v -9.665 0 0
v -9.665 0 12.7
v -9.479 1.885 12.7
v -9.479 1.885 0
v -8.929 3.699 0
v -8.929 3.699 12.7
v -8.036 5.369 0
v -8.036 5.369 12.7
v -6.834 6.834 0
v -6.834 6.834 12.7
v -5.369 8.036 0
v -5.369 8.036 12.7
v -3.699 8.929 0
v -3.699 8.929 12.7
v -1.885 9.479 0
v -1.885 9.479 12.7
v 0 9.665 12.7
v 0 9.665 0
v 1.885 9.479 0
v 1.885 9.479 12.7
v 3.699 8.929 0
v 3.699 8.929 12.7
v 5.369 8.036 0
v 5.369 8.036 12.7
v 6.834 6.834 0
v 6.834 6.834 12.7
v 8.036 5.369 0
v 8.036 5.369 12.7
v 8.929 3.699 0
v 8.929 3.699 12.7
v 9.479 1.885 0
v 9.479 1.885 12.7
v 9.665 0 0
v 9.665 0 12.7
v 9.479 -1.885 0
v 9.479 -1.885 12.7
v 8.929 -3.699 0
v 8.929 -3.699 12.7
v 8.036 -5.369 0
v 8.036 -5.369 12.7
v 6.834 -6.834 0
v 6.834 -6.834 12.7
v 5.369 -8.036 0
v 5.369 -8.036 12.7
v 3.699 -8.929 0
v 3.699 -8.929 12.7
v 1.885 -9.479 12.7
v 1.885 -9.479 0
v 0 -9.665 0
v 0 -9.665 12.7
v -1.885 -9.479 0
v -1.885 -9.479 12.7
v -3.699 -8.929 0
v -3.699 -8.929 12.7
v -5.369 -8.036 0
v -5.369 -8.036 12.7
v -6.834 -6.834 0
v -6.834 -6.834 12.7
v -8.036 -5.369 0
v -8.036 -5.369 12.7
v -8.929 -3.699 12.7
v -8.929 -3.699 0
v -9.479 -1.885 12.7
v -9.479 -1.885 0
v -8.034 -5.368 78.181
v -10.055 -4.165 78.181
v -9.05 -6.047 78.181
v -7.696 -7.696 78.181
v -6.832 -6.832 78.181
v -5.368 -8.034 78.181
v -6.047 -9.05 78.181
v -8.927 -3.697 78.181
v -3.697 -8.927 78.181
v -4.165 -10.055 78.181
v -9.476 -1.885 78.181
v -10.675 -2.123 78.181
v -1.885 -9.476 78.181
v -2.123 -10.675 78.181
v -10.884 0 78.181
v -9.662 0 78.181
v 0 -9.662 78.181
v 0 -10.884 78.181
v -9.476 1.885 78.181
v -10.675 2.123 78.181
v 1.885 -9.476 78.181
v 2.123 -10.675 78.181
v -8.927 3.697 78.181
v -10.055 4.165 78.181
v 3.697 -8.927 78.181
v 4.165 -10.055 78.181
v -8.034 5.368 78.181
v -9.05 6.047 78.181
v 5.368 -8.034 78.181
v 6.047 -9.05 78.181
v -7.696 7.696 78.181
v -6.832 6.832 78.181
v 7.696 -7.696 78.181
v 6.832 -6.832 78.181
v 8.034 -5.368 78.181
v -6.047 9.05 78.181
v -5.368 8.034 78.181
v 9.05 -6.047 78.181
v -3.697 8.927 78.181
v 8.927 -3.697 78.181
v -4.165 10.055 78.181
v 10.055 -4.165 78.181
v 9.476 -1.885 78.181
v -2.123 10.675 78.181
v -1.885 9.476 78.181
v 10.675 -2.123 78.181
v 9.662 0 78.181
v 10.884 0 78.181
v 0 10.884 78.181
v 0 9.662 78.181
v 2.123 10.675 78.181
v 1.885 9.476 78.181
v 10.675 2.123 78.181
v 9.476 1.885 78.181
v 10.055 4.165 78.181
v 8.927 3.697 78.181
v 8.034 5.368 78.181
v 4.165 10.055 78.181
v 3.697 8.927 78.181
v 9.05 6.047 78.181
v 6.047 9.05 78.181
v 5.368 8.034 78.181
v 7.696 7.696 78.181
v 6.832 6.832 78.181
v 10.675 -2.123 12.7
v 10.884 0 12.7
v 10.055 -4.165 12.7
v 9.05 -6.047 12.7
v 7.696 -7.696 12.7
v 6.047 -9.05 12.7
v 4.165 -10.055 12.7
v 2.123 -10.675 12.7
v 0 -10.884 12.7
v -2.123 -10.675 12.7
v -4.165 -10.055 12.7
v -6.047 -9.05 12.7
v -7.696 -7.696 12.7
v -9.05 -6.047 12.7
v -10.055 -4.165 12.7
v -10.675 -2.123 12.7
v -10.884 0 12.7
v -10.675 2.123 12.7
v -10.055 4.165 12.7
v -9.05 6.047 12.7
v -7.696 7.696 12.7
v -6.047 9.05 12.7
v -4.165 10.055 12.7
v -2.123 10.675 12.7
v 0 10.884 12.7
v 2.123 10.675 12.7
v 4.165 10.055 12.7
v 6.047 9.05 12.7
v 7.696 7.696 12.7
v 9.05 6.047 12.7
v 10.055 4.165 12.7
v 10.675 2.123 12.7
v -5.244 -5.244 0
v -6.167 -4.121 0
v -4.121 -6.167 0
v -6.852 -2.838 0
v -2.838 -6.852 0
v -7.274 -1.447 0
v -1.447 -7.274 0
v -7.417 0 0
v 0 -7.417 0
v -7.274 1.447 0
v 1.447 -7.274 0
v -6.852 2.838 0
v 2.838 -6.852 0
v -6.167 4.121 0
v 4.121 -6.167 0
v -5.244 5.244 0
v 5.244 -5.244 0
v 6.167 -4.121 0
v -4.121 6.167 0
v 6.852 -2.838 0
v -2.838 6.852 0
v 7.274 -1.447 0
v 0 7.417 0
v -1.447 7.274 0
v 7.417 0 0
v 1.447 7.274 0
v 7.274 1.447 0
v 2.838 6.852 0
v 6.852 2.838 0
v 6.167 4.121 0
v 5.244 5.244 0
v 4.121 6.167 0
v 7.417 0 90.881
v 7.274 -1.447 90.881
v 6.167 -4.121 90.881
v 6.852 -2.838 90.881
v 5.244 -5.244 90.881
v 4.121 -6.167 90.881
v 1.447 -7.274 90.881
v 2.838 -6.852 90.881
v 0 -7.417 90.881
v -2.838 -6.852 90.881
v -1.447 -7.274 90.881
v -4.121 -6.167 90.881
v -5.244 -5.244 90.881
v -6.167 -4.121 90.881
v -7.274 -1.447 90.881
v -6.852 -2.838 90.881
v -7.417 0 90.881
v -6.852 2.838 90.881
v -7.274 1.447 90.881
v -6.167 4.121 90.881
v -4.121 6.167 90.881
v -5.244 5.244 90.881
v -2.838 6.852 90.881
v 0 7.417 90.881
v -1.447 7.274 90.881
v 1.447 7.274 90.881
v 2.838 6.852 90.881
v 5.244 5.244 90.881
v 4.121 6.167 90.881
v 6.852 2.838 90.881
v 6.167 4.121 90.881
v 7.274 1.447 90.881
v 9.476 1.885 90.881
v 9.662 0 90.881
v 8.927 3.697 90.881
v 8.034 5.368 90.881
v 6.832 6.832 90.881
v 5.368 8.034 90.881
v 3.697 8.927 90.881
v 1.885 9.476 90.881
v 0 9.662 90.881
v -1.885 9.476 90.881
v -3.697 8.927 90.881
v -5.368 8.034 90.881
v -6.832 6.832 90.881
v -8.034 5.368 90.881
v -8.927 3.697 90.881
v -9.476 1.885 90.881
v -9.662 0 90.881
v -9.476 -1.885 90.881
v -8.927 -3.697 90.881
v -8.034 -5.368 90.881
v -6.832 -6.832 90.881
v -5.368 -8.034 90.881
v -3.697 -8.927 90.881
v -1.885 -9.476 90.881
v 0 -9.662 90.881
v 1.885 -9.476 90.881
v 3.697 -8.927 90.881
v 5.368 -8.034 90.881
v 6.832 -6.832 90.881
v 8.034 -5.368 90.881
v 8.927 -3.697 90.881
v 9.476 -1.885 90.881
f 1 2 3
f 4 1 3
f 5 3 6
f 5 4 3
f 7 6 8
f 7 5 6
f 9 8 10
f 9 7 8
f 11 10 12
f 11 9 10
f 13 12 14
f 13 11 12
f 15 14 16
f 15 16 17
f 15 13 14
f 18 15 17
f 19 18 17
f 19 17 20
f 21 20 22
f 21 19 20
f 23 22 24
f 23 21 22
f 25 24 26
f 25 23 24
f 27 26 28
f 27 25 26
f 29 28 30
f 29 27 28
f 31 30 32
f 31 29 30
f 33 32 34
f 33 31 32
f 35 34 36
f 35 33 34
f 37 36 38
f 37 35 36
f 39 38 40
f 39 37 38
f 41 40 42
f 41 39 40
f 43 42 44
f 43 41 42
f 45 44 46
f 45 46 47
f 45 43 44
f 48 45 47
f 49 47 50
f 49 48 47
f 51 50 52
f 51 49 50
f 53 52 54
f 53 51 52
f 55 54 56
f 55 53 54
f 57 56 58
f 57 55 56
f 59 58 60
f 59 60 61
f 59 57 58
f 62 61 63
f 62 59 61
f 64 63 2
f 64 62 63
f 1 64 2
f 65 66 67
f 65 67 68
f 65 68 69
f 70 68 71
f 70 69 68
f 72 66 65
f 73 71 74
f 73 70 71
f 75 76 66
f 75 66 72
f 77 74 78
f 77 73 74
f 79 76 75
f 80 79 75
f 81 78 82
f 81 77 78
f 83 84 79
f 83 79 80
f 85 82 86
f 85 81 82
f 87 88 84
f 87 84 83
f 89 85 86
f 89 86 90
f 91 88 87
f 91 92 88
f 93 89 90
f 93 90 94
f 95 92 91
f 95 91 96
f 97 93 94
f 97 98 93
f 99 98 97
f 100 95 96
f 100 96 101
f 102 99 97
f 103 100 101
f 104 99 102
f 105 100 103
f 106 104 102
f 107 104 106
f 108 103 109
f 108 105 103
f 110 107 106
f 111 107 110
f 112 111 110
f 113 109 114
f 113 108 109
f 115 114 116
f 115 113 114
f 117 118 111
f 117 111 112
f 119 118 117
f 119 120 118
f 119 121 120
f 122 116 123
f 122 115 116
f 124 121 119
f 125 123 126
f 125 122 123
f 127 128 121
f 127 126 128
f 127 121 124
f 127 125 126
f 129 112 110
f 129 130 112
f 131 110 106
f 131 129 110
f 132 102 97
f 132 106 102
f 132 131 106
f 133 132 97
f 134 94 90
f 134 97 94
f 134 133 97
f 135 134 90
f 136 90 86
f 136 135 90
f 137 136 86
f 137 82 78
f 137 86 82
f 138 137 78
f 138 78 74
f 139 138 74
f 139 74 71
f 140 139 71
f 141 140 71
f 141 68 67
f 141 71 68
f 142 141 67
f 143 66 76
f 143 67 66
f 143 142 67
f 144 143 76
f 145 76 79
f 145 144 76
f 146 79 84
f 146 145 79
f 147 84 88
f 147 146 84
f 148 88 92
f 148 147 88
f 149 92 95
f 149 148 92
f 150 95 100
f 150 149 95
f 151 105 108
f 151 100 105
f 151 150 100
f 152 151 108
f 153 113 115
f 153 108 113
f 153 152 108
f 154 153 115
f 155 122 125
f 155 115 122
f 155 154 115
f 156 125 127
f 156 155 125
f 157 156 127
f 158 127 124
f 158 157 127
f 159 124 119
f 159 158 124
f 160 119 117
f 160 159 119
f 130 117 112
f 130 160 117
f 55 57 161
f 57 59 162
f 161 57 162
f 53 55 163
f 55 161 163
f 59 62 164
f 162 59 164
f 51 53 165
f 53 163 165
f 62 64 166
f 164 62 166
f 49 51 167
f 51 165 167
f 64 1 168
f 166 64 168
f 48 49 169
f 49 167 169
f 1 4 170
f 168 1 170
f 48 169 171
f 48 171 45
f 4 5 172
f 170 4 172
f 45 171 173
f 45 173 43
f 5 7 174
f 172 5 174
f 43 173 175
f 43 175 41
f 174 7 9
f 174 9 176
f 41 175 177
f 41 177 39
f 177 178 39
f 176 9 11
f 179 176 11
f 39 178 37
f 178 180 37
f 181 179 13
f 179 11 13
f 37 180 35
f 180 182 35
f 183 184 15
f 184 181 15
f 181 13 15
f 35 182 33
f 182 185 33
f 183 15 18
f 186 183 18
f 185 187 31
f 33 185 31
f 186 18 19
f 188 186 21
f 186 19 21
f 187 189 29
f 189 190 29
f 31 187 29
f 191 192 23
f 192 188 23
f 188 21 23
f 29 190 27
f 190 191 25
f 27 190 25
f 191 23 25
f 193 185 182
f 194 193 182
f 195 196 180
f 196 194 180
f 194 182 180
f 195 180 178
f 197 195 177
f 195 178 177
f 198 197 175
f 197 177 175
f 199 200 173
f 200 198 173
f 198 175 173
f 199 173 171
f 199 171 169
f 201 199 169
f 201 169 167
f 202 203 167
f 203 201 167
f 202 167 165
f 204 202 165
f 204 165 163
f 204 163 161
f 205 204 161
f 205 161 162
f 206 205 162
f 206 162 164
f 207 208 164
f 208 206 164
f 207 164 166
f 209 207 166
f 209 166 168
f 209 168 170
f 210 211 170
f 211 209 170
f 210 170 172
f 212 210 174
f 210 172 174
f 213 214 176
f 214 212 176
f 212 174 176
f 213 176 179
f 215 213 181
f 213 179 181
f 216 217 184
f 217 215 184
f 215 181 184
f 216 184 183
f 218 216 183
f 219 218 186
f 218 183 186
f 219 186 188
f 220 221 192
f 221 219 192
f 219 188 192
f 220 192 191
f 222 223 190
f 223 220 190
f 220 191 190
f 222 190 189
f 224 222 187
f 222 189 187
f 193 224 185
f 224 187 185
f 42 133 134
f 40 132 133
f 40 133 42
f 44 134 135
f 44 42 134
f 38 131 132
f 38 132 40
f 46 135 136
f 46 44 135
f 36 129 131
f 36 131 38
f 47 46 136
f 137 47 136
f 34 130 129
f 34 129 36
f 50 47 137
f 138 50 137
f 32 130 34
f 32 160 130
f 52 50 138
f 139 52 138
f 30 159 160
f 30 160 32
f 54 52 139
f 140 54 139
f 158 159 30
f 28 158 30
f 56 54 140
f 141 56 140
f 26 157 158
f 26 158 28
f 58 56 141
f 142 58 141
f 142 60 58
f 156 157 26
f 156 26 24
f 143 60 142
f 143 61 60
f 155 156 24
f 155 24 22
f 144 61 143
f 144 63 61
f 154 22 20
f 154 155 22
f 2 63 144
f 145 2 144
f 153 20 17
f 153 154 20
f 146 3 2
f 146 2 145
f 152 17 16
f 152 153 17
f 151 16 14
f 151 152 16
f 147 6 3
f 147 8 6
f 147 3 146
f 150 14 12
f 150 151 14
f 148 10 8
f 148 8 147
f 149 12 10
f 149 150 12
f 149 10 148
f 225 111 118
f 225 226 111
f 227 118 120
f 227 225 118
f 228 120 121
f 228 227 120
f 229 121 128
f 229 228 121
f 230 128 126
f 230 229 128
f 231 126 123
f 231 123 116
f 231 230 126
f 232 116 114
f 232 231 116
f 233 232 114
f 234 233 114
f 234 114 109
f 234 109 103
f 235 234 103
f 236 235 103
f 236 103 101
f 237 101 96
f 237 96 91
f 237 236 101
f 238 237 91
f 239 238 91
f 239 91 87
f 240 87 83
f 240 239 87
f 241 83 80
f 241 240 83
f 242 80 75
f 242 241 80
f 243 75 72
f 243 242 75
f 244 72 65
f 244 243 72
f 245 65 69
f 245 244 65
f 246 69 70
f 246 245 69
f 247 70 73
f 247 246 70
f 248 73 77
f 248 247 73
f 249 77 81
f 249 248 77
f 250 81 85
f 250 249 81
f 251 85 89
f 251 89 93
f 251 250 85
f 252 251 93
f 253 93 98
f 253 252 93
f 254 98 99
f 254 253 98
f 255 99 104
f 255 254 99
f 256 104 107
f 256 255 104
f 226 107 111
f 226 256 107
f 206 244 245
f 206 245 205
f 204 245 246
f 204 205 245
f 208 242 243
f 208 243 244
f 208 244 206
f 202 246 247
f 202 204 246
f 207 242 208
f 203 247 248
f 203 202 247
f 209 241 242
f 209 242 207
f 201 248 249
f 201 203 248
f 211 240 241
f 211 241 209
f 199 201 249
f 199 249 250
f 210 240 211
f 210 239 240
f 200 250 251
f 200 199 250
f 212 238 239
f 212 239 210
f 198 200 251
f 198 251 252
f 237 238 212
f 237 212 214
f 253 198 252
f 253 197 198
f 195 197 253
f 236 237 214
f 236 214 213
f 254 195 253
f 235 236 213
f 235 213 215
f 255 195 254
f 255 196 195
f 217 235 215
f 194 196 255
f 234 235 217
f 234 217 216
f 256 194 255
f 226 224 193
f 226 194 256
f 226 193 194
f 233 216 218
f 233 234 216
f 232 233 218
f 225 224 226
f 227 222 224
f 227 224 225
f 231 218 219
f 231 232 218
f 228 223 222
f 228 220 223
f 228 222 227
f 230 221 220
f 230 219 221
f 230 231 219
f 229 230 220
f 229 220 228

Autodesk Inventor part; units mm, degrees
ref_plane "YZ Plane" through (0, 0, 0) normal (1, 0, 0) x (0, 1, 0)
ref_plane "XZ Plane" through (0, 0, 0) normal (0, 1, 0) x (-1, 0, 0)
ref_plane "XY Plane" through (0, 0, 0) normal (0, 0, 1) x (1, 0, 0)
sketch "Sketch1" plane through (0, 0, 0) normal (0, 0, 1) x (1, 0, 0)
  circle A0 centre (0, 0) radius 7.4168
  circle A1 centre (0, 0) radius 10.8839
  dimension "d0" = 14.8336
  dimension "d1" = 21.7678
extrude "Extrusion1" add sketch "Sketch1" along normal blind 90.8812
sketch "Sketch2" plane through (0, 0, 90.8812) normal (0, 0, 1) x (1, 0, 0)
  circle A0 centre (0, 0) radius 10.8839 projected
  circle A1 centre (0, 0) radius 9.662
extrude "Extrusion2" cut sketch "Sketch2" against normal blind 12.7
thread "Thread2" size "13/16-10 UNC" class "2A" standard "ANSI Unified Screw Threads" full length
sketch "Sketch4" plane through (0, 0, 0) normal (0, 0, -1) x (-1, 0, 0)
  circle A0 centre (0, 0) radius 10.8839 projected
  circle A1 centre (0, 0) radius 9.6647
  circle A2 centre (0, 0) radius 10.8839
  dimension "d13" = 19.3294
extrude "Extrusion4" cut sketch "Sketch4" against normal blind 12.7
thread "Thread3" size "13/16-10 UNC" class "2A" standard "ANSI Unified Screw Threads" full length
properties part number "Pipe2"
